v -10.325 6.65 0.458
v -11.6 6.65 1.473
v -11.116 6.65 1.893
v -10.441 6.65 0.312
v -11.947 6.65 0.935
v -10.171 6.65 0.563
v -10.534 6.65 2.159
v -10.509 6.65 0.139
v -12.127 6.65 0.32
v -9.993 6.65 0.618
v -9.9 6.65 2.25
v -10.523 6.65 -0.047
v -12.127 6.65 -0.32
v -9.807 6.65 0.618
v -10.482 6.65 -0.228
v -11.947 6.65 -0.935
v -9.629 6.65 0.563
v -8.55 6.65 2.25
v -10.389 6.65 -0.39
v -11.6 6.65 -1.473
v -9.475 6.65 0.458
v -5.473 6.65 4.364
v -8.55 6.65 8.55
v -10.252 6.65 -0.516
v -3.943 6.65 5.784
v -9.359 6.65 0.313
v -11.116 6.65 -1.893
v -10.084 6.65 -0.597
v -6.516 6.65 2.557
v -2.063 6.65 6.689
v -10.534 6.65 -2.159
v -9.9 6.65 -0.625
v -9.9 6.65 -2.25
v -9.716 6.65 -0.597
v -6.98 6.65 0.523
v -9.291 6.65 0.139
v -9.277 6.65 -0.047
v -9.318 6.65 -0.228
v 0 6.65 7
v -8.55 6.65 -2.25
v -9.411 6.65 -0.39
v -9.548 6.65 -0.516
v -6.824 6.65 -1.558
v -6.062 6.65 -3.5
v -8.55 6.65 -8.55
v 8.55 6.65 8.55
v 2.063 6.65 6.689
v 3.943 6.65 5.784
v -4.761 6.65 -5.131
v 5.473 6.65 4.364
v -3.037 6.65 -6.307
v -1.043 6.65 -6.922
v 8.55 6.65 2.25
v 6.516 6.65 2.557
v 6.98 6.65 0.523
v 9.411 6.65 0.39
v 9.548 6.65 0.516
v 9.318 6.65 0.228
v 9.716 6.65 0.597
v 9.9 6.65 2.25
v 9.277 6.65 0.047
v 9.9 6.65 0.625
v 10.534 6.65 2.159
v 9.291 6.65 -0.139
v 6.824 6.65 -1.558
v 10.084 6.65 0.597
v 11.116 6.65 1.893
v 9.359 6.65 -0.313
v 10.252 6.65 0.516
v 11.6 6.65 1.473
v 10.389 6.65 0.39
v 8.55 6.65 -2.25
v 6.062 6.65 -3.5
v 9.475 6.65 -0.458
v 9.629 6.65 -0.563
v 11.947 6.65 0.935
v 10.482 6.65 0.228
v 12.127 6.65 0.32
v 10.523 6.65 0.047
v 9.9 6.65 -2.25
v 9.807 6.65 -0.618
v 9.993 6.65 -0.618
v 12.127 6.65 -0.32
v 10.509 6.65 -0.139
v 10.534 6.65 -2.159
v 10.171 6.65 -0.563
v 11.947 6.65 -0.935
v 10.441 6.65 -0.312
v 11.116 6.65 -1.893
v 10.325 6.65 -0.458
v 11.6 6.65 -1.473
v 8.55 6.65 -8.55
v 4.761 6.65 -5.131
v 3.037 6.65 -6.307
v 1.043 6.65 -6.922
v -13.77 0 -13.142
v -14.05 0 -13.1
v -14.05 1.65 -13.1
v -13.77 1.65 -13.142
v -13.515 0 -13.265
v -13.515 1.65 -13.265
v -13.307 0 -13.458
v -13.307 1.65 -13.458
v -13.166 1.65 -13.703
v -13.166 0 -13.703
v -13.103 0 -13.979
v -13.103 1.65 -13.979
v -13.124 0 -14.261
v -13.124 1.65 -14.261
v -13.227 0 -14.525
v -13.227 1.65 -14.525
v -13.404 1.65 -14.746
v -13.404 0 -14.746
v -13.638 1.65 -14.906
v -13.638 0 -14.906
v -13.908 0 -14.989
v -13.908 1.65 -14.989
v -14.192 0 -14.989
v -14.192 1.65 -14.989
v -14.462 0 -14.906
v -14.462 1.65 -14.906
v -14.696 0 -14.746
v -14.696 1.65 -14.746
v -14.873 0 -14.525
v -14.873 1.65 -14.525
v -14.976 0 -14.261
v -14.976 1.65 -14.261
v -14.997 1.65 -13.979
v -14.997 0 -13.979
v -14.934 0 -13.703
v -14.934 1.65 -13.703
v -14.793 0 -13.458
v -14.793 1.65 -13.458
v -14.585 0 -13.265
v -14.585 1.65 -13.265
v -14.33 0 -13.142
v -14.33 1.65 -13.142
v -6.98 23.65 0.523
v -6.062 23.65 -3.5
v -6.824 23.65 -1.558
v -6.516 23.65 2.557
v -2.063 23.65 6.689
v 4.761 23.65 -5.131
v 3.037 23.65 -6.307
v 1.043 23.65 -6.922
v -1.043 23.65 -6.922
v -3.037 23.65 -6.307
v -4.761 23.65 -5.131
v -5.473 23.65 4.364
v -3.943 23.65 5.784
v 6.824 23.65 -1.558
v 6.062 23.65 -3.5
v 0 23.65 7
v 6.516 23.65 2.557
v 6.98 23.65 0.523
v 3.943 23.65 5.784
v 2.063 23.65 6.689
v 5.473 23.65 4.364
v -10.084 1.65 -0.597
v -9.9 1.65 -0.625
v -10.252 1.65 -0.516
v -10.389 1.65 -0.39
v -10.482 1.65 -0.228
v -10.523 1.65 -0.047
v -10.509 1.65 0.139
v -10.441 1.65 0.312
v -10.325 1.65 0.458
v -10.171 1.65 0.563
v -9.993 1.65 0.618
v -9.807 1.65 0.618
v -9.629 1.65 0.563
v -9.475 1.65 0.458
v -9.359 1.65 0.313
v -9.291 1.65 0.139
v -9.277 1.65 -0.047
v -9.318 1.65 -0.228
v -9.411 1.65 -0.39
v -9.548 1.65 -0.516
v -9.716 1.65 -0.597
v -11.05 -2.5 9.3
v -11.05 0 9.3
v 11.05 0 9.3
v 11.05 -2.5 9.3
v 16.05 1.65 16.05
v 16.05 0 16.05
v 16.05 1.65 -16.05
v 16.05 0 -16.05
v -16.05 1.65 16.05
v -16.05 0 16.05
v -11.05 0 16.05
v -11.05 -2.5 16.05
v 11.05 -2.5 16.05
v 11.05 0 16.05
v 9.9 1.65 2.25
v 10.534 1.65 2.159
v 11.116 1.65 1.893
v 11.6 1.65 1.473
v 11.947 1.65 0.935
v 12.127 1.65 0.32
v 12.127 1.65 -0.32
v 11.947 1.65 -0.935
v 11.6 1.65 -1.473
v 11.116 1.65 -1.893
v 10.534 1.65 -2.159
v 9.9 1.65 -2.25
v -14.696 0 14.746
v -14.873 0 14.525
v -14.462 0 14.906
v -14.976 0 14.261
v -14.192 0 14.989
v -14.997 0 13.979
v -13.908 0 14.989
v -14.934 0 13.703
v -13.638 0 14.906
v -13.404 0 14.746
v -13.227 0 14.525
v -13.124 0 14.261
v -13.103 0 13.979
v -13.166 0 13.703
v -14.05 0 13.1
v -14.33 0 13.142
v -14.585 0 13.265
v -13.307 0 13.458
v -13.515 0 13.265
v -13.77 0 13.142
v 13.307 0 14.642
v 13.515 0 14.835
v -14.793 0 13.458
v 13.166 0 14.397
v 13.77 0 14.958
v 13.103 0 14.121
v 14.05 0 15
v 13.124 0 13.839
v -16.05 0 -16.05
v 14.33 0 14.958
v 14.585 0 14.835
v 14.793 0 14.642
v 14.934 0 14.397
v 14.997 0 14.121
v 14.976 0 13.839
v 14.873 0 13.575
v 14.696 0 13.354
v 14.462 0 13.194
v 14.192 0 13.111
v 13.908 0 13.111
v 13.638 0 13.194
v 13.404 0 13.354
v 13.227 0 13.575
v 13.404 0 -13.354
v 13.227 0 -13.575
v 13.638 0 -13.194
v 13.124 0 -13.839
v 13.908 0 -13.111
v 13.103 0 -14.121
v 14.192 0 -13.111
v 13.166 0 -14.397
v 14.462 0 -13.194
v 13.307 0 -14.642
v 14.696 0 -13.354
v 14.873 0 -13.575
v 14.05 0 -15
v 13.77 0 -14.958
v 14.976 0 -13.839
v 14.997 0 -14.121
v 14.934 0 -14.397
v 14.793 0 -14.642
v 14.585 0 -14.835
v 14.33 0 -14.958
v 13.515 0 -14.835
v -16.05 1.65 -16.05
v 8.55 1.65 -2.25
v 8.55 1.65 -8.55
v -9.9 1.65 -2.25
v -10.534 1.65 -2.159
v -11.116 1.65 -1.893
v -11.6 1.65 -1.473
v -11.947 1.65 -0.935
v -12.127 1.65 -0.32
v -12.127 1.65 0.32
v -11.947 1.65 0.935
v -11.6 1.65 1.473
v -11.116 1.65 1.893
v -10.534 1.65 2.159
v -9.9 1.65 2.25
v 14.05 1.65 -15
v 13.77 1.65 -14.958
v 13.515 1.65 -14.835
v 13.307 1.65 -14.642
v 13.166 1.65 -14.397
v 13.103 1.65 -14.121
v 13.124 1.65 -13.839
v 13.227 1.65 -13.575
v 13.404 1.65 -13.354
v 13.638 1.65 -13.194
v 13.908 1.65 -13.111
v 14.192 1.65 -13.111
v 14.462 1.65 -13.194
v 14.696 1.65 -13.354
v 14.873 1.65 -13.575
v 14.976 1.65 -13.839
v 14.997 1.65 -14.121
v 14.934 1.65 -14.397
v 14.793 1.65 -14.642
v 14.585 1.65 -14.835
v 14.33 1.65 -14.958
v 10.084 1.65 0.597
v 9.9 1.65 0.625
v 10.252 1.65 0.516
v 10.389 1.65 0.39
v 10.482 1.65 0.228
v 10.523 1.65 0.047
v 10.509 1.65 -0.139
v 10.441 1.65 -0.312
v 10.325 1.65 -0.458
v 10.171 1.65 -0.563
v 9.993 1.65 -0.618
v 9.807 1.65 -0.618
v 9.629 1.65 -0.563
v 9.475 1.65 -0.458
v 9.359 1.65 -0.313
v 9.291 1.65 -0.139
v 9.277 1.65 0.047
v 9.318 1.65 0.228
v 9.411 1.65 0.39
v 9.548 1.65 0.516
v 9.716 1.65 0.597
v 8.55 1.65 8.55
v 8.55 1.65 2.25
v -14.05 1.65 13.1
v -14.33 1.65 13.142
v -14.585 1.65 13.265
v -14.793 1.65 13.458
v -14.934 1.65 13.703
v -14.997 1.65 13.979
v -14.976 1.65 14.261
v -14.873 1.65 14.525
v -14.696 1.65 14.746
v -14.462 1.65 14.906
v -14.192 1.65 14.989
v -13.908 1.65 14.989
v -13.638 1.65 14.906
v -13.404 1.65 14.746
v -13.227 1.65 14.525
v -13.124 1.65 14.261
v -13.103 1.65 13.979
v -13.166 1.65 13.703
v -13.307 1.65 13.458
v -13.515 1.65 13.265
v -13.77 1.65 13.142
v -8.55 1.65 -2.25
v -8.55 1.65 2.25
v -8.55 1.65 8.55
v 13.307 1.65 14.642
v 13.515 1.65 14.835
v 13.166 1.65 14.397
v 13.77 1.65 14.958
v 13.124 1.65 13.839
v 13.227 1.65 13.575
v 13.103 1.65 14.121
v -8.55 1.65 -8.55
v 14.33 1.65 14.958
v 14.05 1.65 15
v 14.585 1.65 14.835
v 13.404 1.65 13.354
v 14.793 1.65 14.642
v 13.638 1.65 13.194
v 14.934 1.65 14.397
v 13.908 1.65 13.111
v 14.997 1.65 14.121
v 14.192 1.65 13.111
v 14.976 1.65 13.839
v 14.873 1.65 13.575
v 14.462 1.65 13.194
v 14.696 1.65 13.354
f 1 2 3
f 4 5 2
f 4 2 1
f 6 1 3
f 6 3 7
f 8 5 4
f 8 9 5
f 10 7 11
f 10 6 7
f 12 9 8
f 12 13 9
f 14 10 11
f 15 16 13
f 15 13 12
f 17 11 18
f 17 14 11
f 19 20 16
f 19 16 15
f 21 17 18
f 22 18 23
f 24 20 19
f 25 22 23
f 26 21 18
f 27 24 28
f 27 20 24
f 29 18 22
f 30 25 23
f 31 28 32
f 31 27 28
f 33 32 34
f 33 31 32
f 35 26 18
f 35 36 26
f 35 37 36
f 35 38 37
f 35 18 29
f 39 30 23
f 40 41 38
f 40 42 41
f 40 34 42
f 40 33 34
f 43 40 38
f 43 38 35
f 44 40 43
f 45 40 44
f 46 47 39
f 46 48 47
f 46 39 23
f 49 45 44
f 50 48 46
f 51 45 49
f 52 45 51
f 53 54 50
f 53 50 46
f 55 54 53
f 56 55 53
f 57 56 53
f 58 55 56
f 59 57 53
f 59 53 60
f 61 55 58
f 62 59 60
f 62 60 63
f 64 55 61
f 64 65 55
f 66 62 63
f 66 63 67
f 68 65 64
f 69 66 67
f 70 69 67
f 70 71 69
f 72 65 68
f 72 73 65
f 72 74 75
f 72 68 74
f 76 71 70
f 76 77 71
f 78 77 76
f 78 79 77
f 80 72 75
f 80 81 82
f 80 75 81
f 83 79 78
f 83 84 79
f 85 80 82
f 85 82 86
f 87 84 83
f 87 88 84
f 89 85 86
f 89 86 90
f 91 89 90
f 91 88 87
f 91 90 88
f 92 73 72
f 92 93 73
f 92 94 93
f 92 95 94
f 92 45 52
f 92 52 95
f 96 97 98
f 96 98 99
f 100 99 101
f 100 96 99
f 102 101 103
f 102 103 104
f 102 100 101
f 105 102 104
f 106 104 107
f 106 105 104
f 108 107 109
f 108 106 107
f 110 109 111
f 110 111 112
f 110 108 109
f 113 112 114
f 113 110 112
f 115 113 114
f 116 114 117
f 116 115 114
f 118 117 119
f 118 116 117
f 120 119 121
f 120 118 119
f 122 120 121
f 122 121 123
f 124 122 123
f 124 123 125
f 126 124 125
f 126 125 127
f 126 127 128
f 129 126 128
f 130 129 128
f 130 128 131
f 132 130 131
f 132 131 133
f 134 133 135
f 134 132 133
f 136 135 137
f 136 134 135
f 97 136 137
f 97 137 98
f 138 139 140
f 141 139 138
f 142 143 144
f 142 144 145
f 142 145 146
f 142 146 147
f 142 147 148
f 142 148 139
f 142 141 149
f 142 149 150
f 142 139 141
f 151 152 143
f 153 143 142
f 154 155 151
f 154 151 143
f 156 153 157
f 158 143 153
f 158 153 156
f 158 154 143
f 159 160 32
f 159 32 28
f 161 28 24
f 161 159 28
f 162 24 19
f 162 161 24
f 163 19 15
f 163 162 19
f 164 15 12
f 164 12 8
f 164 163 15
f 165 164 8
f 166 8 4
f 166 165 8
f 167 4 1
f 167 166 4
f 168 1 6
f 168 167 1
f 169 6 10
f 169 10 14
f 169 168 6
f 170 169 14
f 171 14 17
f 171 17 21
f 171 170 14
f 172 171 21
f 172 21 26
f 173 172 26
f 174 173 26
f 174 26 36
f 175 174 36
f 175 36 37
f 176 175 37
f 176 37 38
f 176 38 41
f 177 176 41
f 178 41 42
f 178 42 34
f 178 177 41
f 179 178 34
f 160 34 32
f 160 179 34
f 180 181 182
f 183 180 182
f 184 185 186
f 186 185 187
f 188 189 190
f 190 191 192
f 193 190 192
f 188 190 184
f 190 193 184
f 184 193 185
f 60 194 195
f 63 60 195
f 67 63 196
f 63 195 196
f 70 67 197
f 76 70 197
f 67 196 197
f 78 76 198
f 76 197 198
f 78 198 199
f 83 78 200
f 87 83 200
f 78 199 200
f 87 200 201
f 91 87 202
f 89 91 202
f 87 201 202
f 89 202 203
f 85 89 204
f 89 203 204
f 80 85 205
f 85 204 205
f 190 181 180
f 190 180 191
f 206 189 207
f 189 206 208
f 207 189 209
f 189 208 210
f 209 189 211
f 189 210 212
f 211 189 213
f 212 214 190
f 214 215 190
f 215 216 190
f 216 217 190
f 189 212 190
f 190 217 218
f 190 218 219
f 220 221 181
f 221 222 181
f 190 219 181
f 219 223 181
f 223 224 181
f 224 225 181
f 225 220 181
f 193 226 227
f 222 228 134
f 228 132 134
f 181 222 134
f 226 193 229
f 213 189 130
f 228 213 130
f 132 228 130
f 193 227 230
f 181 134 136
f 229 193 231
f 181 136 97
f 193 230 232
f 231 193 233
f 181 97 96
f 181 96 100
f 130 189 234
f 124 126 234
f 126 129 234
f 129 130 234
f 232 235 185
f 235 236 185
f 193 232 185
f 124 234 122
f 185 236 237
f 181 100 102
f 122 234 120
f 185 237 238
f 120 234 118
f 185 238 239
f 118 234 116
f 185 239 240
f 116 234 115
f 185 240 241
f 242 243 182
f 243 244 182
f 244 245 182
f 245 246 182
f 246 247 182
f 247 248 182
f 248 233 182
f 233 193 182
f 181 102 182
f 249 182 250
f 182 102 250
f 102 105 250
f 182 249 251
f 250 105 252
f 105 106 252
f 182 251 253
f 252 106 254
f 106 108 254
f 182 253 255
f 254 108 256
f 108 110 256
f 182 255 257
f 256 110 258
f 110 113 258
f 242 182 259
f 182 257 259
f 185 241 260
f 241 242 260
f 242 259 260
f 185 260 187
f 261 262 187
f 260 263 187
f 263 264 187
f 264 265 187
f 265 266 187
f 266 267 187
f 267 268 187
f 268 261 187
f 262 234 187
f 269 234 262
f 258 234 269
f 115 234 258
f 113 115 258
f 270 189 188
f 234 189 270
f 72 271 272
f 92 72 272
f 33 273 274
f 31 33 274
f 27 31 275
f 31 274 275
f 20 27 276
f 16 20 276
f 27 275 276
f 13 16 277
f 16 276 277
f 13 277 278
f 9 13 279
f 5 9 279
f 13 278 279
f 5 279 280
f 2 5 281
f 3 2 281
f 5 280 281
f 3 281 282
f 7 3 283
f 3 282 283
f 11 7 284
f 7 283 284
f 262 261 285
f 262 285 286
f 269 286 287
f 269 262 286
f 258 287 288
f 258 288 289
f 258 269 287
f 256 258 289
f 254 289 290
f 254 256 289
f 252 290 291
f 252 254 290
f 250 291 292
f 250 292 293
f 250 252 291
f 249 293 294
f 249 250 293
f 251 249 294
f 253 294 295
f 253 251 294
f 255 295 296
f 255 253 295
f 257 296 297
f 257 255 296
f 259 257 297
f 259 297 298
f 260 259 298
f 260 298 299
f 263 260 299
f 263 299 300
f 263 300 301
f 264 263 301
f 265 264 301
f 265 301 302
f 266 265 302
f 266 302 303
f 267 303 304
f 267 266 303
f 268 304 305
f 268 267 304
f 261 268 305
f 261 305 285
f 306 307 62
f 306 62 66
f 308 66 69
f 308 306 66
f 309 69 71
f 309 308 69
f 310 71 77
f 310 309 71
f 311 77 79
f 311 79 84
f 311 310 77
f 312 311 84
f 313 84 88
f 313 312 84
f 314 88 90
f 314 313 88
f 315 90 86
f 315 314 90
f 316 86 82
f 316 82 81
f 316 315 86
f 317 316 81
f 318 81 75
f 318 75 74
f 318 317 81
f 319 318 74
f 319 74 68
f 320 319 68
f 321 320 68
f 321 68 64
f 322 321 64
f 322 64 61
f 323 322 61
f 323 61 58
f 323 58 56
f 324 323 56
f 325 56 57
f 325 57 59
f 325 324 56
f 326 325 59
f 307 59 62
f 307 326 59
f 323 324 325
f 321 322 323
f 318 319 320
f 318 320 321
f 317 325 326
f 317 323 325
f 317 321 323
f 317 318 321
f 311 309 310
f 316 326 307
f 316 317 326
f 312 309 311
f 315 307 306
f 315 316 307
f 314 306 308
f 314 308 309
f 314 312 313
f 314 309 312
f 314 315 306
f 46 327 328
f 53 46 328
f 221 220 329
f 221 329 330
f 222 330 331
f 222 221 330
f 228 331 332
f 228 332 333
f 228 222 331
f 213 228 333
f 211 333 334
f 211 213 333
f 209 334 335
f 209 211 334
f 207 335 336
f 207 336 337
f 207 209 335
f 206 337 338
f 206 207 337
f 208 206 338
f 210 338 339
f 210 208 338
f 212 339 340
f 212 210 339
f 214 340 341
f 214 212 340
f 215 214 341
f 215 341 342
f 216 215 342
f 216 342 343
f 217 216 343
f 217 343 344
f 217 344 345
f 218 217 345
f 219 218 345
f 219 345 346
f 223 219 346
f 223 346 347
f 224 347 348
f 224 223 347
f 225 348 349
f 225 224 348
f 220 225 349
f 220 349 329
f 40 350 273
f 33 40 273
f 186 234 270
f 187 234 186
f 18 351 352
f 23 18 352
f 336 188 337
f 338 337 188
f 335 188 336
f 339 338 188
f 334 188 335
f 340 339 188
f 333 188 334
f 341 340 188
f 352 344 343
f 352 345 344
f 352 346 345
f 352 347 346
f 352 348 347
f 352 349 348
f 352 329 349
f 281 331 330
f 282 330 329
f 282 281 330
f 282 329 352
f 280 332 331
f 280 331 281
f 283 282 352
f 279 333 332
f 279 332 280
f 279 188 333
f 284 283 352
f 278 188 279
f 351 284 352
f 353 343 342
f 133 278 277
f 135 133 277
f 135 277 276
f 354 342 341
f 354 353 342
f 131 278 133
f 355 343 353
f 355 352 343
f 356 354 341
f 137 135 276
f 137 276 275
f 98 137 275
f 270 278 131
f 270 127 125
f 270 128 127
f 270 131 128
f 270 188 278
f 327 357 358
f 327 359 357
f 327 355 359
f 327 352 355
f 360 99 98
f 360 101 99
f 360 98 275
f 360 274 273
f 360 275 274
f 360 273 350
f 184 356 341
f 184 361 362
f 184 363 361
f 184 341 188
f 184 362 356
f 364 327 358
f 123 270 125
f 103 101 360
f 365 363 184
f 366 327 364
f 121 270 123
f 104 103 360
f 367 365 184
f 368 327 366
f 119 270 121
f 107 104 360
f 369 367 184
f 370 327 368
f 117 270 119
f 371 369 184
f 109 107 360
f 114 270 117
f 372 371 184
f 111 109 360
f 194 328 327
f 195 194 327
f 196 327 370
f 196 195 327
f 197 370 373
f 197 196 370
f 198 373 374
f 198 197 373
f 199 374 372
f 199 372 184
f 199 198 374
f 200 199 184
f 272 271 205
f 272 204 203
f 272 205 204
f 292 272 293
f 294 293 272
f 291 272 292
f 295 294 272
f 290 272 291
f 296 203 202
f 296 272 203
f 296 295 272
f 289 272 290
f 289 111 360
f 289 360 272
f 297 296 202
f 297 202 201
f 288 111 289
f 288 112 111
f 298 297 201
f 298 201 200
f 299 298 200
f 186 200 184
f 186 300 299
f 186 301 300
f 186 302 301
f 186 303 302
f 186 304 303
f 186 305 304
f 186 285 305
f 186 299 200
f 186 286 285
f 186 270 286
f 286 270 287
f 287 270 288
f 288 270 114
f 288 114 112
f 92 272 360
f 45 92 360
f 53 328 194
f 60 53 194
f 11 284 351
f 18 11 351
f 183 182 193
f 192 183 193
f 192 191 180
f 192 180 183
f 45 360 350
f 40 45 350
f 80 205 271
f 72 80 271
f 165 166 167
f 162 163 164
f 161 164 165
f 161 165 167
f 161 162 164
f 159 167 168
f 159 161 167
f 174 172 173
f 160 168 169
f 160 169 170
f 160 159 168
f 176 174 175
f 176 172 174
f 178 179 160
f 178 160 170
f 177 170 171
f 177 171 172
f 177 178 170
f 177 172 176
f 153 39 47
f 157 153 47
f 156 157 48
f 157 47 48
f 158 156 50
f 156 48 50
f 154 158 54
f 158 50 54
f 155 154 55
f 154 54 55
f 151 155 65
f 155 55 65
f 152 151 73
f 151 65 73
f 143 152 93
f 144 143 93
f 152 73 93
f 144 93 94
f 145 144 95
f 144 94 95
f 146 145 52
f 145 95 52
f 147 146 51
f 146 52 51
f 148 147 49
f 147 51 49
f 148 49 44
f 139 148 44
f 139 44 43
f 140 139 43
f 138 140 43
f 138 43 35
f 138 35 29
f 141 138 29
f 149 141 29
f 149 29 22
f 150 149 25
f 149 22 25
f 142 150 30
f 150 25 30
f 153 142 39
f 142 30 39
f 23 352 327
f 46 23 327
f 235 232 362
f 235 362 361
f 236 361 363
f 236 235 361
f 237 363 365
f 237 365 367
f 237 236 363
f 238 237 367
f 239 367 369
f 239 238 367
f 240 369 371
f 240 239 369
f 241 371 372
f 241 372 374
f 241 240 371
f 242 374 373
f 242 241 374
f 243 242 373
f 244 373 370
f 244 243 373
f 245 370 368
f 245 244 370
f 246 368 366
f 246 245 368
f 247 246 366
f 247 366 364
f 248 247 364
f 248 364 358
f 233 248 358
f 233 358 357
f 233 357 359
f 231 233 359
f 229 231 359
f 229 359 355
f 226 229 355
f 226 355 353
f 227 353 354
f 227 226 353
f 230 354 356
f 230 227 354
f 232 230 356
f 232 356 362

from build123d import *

# Parameters (mm, degrees)
SKETCH1_W           = 32.1
SKETCH1_H           = 32.1
SKETCH1_R           = 0.95
BOSS_EXTRUDE1_DEPTH = 1.65
SKETCH2_W           = 22.1
SKETCH2_H           = 6.75
BOSS_EXTRUDE2_DEPTH = 2.5
SKETCH3_R           = 0.625
BOSS_EXTRUDE3_DEPTH = 5
SKETCH4_R           = 7
BOSS_EXTRUDE4_DEPTH = 17


with BuildPart() as part:
    # Sketch1 → Boss-Extrude1 (new body)
    with BuildSketch(Plane(origin=(0, 0, 0), x_dir=(1, 0, 0), z_dir=(0, 1, 0))):
        Rectangle(SKETCH1_W, SKETCH1_H)
        with Locations(Location((-14.05, 14.05, 0), (0, 0, 270))):
            Circle(SKETCH1_R, mode=Mode.SUBTRACT)
        with Locations(Location((14.05, 14.05, 0), (0, 0, 90))):
            Circle(SKETCH1_R, mode=Mode.SUBTRACT)
        with Locations(Location((14.05, -14.05, 0), (0, 0, 270))):
            Circle(SKETCH1_R, mode=Mode.SUBTRACT)
        with Locations(Location((-14.05, -14.05, 0), (0, 0, 90))):
            Circle(SKETCH1_R, mode=Mode.SUBTRACT)
    extrude(amount=BOSS_EXTRUDE1_DEPTH)

    # Sketch2 → Boss-Extrude2 (add)
    with BuildSketch(Plane.XZ):
        with Locations((0, 12.675)):
            Rectangle(SKETCH2_W, SKETCH2_H)
    extrude(amount=BOSS_EXTRUDE2_DEPTH)

    # Sketch3 → Boss-Extrude3 (add)
    with BuildSketch(Plane(origin=(0, 1.65, 0), x_dir=(1, 0, 0), z_dir=(0, 1, 0))):
        with BuildLine():
            Line((9.9, 2.25), (8.55, 2.25))
            Line((8.55, 2.25), (8.55, 8.55))
            Line((8.55, 8.55), (-8.55, 8.55))
            Line((-8.55, 8.55), (-8.55, 2.25))
            Line((-8.55, 2.25), (-9.9, 2.25))
            ThreePointArc((-9.9, 2.25), (-12.15, 0), (-9.9, -2.25))
            Line((-9.9, -2.25), (-8.55, -2.25))
            Line((-8.55, -2.25), (-8.55, -8.55))
            Line((-8.55, -8.55), (8.55, -8.55))
            Line((8.55, -8.55), (8.55, -2.25))
            Line((8.55, -2.25), (9.9, -2.25))
            ThreePointArc((9.9, -2.25), (12.15, 0), (9.9, 2.25))
        make_face()
        with Locations(Location((9.9, 0, 0), (0, 0, 270))):
            Circle(SKETCH3_R, mode=Mode.SUBTRACT)
        with Locations(Location((-9.9, 0, 0), (0, 0, 90))):
            Circle(SKETCH3_R, mode=Mode.SUBTRACT)
    extrude(amount=BOSS_EXTRUDE3_DEPTH)

    # Sketch4 → Boss-Extrude4 (add)
    with BuildSketch(Plane(origin=(0, 6.65, 0), x_dir=(1, 0, 0), z_dir=(0, 1, 0))):
        with Locations(Location((0, 0, 0), (0, 0, 270))):
            Circle(SKETCH4_R)
    extrude(amount=BOSS_EXTRUDE4_DEPTH)


solid = part.part
